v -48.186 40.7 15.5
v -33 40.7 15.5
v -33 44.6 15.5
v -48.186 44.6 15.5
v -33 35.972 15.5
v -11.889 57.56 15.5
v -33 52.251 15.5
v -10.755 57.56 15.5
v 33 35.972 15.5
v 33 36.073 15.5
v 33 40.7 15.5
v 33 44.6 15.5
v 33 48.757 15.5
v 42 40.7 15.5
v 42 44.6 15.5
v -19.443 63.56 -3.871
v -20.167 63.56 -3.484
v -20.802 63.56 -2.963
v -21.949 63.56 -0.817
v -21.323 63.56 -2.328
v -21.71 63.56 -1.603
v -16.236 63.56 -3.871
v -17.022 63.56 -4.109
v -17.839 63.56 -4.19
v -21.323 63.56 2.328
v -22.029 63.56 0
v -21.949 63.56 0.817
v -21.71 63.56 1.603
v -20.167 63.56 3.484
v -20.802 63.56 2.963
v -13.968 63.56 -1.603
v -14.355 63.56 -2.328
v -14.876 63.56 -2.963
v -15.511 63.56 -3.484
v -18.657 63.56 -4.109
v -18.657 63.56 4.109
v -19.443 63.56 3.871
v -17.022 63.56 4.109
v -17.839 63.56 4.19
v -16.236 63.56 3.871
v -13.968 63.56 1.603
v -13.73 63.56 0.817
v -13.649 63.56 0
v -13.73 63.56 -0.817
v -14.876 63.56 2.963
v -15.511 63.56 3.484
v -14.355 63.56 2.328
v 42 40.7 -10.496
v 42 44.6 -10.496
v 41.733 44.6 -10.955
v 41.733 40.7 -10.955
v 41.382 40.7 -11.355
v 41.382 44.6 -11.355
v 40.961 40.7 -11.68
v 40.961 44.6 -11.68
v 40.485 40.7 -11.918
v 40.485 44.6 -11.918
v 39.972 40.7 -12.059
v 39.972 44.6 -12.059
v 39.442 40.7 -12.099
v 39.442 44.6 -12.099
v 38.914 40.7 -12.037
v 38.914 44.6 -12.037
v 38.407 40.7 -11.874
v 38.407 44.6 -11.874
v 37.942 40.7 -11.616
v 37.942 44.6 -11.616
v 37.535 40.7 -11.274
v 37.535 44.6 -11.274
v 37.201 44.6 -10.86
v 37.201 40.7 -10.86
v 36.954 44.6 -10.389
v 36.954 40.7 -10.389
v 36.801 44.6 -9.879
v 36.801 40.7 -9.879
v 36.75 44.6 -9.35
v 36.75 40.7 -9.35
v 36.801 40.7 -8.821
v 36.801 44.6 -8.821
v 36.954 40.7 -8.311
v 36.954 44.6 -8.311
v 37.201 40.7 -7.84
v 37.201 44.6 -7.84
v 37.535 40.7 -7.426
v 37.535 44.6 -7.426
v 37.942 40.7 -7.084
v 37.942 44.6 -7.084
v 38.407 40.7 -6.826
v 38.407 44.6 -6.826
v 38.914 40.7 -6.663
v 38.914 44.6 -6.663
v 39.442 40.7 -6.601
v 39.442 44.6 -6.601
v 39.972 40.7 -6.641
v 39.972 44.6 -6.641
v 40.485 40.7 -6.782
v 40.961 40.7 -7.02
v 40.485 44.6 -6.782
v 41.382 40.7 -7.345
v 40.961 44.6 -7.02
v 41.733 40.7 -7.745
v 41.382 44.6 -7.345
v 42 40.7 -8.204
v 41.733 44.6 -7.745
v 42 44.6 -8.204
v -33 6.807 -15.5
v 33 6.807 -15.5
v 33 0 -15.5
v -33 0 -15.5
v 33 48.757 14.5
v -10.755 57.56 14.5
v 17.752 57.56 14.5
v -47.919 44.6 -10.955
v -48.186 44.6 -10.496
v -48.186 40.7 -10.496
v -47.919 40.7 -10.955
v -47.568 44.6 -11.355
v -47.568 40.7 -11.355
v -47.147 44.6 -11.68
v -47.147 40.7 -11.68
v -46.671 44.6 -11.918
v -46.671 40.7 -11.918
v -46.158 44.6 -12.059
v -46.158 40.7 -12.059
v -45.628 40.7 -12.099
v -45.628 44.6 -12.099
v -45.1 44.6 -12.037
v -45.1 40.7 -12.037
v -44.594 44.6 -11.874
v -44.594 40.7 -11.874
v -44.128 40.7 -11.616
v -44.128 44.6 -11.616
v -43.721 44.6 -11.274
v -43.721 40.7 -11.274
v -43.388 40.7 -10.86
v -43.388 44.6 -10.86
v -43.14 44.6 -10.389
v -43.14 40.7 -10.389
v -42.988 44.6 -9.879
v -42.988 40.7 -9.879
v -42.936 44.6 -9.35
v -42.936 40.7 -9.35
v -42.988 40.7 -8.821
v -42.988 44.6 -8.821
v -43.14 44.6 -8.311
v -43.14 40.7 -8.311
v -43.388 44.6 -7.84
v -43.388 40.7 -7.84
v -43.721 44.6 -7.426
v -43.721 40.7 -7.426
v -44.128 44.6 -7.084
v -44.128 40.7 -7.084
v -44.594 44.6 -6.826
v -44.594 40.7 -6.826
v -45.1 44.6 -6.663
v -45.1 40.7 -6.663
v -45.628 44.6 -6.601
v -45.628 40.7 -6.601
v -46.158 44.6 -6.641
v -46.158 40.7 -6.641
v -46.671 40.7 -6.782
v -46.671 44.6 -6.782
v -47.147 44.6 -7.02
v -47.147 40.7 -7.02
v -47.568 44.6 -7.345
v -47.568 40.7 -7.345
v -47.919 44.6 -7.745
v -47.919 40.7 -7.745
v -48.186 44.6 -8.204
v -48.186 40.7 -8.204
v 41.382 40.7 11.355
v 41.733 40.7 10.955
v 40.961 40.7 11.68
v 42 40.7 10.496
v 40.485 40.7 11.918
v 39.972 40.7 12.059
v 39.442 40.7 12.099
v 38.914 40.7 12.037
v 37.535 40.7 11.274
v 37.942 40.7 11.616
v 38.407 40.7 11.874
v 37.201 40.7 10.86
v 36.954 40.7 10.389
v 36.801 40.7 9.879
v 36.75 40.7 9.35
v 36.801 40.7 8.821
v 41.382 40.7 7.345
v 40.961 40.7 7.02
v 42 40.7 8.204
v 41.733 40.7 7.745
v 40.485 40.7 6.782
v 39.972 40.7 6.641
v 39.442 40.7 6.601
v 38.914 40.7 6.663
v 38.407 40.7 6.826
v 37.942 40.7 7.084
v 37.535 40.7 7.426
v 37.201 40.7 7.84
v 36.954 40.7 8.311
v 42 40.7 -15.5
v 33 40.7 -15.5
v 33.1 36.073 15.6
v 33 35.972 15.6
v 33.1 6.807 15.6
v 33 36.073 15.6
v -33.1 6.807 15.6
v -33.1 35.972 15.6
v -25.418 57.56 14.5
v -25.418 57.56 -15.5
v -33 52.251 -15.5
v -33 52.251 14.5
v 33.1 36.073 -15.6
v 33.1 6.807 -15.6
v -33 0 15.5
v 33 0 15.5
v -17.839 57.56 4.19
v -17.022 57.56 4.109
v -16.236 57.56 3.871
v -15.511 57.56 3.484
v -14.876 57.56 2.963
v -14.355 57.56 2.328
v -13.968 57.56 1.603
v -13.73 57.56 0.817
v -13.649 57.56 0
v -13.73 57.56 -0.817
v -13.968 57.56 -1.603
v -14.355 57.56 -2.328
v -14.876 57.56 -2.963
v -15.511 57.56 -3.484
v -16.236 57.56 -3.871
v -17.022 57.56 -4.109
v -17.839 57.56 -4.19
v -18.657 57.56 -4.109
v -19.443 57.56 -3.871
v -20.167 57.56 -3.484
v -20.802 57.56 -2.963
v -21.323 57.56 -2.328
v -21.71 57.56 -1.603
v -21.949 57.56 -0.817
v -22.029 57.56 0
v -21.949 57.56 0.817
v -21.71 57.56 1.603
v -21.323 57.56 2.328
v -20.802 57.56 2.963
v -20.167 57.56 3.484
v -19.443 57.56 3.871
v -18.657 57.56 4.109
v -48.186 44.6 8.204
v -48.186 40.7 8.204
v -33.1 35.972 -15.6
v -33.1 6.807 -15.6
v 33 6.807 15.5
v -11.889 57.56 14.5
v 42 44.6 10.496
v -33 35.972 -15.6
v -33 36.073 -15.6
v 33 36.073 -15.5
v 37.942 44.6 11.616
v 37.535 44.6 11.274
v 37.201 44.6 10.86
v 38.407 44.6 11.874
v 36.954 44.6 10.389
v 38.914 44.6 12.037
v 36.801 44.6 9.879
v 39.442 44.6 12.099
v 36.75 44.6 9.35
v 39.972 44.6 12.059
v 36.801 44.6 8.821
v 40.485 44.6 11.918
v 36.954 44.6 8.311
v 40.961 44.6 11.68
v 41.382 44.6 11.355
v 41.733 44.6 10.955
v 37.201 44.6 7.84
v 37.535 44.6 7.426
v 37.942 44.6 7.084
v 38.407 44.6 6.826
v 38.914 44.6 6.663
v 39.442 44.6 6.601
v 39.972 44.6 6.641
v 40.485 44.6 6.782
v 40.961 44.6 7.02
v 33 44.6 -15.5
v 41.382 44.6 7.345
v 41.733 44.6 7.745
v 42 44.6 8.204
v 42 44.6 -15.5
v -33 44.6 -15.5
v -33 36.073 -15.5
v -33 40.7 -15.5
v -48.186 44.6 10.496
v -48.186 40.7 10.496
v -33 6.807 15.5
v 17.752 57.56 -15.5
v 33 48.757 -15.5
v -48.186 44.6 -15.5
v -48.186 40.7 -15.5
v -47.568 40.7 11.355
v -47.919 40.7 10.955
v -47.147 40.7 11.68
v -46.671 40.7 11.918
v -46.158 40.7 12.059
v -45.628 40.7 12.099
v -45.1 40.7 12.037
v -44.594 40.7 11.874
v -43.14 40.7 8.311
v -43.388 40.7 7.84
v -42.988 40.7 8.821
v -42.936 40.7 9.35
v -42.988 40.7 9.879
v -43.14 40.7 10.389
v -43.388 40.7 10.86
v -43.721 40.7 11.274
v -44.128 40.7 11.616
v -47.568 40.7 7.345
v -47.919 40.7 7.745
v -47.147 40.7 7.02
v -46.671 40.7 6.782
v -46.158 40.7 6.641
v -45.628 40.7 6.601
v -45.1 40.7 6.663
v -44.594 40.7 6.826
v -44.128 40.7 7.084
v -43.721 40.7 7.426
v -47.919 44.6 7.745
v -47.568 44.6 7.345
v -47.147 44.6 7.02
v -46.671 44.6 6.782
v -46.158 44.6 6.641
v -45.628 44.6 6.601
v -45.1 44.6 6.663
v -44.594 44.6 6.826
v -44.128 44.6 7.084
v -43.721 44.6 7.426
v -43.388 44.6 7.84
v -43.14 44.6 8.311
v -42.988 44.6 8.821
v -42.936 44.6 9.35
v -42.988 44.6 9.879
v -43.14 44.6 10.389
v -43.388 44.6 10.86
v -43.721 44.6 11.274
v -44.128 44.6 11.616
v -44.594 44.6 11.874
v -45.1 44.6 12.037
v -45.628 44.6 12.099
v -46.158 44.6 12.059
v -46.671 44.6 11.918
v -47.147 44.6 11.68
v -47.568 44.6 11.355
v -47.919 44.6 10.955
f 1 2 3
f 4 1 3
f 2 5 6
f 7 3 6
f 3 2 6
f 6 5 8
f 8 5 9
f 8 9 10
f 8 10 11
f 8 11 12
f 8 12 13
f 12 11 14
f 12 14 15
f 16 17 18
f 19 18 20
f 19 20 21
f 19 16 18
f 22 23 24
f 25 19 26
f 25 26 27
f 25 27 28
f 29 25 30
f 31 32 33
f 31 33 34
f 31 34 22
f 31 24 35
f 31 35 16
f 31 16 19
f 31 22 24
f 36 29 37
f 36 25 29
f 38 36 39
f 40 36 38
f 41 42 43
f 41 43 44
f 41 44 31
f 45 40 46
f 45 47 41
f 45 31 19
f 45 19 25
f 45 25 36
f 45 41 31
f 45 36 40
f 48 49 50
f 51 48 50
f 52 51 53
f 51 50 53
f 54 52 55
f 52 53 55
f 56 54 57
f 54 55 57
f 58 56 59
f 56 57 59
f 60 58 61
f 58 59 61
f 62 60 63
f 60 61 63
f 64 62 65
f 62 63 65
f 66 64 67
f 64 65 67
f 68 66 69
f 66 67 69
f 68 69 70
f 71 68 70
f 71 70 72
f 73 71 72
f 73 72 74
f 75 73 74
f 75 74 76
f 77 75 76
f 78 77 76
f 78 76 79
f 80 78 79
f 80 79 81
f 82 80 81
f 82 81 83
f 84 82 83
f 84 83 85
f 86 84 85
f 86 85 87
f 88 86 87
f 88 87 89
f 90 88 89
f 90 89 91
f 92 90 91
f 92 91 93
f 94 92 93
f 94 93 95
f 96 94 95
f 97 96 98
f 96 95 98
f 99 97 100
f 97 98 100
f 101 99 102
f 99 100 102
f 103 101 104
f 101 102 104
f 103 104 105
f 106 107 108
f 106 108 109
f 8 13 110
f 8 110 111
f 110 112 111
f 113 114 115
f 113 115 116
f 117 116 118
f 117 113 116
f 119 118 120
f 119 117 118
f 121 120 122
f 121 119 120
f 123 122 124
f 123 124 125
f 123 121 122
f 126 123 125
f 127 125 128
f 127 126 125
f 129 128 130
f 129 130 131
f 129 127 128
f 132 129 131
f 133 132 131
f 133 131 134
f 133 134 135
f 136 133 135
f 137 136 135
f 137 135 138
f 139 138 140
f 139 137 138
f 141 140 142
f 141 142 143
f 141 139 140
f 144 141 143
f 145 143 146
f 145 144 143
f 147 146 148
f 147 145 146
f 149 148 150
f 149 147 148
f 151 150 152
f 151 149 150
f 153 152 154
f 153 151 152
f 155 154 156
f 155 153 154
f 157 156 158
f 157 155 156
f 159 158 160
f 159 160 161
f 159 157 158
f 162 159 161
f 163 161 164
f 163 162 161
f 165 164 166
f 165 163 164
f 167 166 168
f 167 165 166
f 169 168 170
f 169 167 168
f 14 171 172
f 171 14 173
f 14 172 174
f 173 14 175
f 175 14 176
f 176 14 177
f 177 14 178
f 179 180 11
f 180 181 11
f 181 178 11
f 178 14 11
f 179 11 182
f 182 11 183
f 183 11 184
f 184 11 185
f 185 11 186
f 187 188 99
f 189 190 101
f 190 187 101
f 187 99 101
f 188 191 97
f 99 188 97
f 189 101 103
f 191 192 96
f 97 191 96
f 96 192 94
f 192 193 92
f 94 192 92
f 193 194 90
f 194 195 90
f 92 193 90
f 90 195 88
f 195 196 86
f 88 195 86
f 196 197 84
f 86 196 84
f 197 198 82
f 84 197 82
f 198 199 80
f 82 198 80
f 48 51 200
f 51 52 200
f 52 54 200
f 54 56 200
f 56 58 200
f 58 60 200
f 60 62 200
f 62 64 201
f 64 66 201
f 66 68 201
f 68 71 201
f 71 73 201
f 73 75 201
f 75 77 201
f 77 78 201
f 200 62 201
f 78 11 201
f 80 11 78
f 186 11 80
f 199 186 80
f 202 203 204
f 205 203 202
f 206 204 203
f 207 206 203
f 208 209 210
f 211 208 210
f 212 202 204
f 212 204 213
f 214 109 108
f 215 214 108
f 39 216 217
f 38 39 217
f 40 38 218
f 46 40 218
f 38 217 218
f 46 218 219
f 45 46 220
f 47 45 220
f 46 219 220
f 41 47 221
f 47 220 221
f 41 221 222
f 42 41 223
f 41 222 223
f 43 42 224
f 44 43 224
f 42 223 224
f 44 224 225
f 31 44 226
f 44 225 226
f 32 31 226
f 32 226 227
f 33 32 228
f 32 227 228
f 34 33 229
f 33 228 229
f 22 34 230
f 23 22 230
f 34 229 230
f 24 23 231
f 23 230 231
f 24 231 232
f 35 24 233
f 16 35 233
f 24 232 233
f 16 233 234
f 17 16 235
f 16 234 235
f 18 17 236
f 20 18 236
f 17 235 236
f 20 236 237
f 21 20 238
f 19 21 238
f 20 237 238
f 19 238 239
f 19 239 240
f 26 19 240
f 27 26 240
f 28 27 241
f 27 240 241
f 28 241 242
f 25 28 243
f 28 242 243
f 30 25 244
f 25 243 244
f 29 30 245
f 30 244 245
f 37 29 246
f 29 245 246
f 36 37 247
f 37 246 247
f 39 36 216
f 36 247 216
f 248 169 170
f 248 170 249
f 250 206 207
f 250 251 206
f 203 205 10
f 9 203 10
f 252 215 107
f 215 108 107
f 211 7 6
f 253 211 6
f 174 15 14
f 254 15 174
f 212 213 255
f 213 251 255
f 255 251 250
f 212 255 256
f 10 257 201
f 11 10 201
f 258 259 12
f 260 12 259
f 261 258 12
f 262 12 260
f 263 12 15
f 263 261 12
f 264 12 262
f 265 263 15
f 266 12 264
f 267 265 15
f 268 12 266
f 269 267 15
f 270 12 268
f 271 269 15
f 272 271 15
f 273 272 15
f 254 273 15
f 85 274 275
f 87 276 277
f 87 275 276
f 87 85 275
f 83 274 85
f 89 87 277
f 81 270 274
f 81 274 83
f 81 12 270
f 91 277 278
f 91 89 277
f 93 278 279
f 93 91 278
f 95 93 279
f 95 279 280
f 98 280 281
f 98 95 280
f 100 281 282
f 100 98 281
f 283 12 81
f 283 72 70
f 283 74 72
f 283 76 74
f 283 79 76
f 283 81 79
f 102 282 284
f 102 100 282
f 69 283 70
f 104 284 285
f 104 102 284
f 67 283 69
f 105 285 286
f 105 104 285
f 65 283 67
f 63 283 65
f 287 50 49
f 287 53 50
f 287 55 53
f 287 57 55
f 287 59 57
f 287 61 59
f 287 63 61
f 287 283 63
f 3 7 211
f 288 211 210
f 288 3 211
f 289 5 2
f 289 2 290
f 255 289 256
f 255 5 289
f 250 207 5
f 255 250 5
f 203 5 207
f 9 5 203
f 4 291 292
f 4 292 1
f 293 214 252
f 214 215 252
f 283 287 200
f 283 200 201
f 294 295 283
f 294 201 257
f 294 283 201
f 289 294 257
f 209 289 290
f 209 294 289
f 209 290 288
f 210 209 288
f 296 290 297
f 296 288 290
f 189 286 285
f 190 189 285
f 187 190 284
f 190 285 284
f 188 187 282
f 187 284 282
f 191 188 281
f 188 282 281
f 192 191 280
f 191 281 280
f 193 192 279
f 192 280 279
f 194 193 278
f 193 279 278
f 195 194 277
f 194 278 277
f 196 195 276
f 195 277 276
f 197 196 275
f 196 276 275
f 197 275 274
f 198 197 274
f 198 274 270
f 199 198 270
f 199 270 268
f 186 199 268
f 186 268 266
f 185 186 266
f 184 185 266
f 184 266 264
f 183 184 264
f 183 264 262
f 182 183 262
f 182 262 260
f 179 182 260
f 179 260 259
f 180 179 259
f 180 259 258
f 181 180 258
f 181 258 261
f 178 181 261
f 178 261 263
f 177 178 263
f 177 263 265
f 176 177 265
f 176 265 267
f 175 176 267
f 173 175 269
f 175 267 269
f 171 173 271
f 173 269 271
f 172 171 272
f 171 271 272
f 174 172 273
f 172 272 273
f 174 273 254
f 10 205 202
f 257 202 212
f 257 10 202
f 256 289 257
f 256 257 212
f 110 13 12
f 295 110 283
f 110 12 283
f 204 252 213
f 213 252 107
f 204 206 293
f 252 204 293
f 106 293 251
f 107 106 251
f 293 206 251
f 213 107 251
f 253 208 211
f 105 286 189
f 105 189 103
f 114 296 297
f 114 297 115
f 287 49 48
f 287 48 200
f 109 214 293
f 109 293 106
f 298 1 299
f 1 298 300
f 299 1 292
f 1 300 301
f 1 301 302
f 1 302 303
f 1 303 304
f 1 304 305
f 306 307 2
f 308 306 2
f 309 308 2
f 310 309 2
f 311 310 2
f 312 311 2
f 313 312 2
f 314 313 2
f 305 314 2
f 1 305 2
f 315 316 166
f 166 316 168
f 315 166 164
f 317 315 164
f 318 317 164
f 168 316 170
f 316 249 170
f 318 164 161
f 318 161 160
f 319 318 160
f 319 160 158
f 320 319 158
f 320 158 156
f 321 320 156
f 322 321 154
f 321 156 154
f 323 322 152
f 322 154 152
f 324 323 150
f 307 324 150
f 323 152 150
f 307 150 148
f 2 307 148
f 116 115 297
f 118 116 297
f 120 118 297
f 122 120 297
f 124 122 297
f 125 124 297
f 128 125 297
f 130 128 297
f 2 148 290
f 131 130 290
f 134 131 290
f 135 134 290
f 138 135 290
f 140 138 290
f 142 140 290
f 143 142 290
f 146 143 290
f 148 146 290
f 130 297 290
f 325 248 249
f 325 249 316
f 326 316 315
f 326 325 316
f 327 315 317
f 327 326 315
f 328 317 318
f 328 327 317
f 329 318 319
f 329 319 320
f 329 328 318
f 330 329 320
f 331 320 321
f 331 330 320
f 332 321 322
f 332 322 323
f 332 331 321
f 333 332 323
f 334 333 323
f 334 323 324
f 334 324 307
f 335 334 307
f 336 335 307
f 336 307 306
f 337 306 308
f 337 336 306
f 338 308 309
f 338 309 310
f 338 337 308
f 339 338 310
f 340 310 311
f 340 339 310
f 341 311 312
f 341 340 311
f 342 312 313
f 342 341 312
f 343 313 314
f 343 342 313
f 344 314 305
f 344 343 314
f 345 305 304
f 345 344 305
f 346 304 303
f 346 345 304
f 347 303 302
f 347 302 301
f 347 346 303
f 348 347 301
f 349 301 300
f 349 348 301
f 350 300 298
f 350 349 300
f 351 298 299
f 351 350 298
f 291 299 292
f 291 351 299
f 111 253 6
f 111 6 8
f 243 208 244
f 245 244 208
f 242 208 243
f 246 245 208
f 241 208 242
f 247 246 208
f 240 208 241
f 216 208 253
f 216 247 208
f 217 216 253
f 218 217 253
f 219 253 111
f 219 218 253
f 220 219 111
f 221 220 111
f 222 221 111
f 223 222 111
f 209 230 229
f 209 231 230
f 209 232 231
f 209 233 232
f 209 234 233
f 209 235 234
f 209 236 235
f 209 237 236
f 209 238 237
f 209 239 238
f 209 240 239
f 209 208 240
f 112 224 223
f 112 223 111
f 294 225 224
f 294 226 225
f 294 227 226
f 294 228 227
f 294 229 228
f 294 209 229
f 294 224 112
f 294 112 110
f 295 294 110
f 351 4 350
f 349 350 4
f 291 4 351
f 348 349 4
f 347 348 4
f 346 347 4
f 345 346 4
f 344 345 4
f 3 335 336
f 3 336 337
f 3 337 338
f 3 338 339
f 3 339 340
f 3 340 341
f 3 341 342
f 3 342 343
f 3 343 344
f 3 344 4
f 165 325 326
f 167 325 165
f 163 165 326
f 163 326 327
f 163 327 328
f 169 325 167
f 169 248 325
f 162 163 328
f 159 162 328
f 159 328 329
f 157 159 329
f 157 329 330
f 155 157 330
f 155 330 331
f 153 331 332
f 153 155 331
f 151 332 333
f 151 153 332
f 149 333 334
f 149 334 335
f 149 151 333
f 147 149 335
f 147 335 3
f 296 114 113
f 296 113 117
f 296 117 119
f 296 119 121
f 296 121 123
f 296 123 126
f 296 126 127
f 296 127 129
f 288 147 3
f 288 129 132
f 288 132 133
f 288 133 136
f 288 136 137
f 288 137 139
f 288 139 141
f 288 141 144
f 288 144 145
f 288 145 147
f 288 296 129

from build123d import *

# Parameters (mm, degrees)
SKETCH2_W            = 66
SKETCH2_H            = 31
BOSS_EXTRUDE1_DEPTH  = 44.6
SKETCH4_W            = 31
SKETCH4_H            = 3.9
BOSS_EXTRUDE2_DEPTH  = 9
SKETCH6_R            = 2.75
CUT_EXTRUDE3_DEPTH   = 64.193433203
BOSS_EXTRUDE4_DEPTH  = 3.9
SKETCH8_W            = 66
SKETCH8_H            = 31
BOSS_EXTRUDE5_DEPTH  = 12.96
CUT_EXTRUDE7_DEPTH   = 82.21610038
CUT_EXTRUDE8_DEPTH   = 82.21610038
CUT_EXTRUDE9_DEPTH   = 1
SKETCH12_R           = 4.19
BOSS_EXTRUDE6_DEPTH  = 6
SKETCH13_W           = 66
SKETCH13_H           = 29.265979079
BOSS_EXTRUDE7_DEPTH  = 0.1
SKETCH14_W           = 31.1
SKETCH14_H           = 29.164669929
BOSS_EXTRUDE8_DEPTH  = 0.1
SKETCH15_W           = 66.1
SKETCH15_H           = 29.164669929
BOSS_EXTRUDE9_DEPTH  = 0.1
SKETCH16_W           = 31.2
SKETCH16_H           = 29.265979079
BOSS_EXTRUDE10_DEPTH = 0.1


with BuildPart() as part:
    # Sketch2 → Boss-Extrude1 (new body)
    with BuildSketch(Plane(origin=(0, 0, 0), x_dir=(1, 0, 0), z_dir=(0, 1, 0))):
        Rectangle(SKETCH2_W, SKETCH2_H)
    extrude(amount=BOSS_EXTRUDE1_DEPTH)

    # Sketch4 → Boss-Extrude2 (add)
    with BuildSketch(Plane(origin=(33, 0, 0), x_dir=(0, 0, -1), z_dir=(1, 0, 0))):
        with Locations((0, 42.65)):
            Rectangle(SKETCH4_W, SKETCH4_H)
    extrude(amount=BOSS_EXTRUDE2_DEPTH)

    # Sketch6 → Cut-Extrude3 (cut, through all)
    with BuildSketch(Plane(origin=(0, 44.6, 0), x_dir=(1, 0, 0), z_dir=(0, 1, 0))):
        with Locations((39.5, -9.35)):
            Circle(SKETCH6_R)
        with Locations((39.5, 9.35)):
            Circle(SKETCH6_R)
    extrude(amount=-CUT_EXTRUDE3_DEPTH, mode=Mode.SUBTRACT)

    # Sketch7 → Boss-Extrude4 (add)
    with BuildSketch(Plane(origin=(0, 44.6, 0), x_dir=(1, 0, 0), z_dir=(0, 1, 0))):
        with BuildLine():
            Line((-33, 15.5), (-48.186111703, 15.5))
            Line((-48.186111703, 15.5), (-48.186111703, 10.495643924))
            ThreePointArc((-48.186111703, 10.495643924), (-42.936111703, 9.35), (-48.186111703, 8.204356076))
            Line((-48.186111703, 8.204356076), (-48.186111703, -8.204356076))
            ThreePointArc((-48.186111703, -8.204356076), (-42.936111703, -9.35), (-48.186111703, -10.495643924))
            Line((-48.186111703, -10.495643924), (-48.186111703, -15.5))
            Line((-48.186111703, -15.5), (-33, -15.5))
            Line((-33, -15.5), (-33, 15.5))
        make_face()
    extrude(amount=-BOSS_EXTRUDE4_DEPTH)

    # Sketch8 → Boss-Extrude5 (add)
    with BuildSketch(Plane(origin=(0, 44.6, 0), x_dir=(1, 0, 0), z_dir=(0, 1, 0))):
        Rectangle(SKETCH8_W, SKETCH8_H)
    extrude(amount=BOSS_EXTRUDE5_DEPTH)

    # Sketch9 → Cut-Extrude7 (cut, through all)
    with BuildSketch(Plane.XY.offset(15.5)):
        Polygon((-25.417976584, 57.56), (-33, 52.251010049), (-33, 57.56), align=None)
    extrude(amount=-CUT_EXTRUDE7_DEPTH, mode=Mode.SUBTRACT)

    # Sketch10 → Cut-Extrude8 (cut, through all)
    with BuildSketch(Plane.XY.offset(15.5)):
        Polygon((17.751890933, 57.56), (33, 48.756500125), (33, 57.56), align=None)
    extrude(amount=-CUT_EXTRUDE8_DEPTH, mode=Mode.SUBTRACT)

    # Sketch11 → Cut-Extrude9 (cut)
    with BuildSketch(Plane.XY.offset(15.5)):
        Polygon((-33, 52.251010049), (-11.889467425, 57.56), (-25.417976584, 57.56), align=None)
        Polygon((33, 48.756500125), (-10.755426907, 57.56), (17.751890933, 57.56), align=None)
    extrude(amount=-CUT_EXTRUDE9_DEPTH, mode=Mode.SUBTRACT)

    # Sketch12 → Boss-Extrude6 (add)
    with BuildSketch(Plane(origin=(0, 57.56, 0), x_dir=(1, 0, 0), z_dir=(0, 1, 0))):
        with Locations(Location((-17.839262747, 0, 0), (0, 0, 270))):
            Circle(SKETCH12_R)
    extrude(amount=BOSS_EXTRUDE6_DEPTH)

    # Sketch13 → Boss-Extrude7 (add)
    with BuildSketch(Plane(origin=(0, 0, -15.5), x_dir=(-1, 0, 0), z_dir=(0, 0, -1))):
        with Locations((0, 21.440452746)):
            Rectangle(SKETCH13_W, SKETCH13_H)
    extrude(amount=BOSS_EXTRUDE7_DEPTH)

    # Sketch14 → Boss-Extrude8 (add)
    with BuildSketch(Plane.ZY.offset(33)):
        with Locations((-0.05, 21.389798171)):
            Rectangle(SKETCH14_W, SKETCH14_H)
    extrude(amount=BOSS_EXTRUDE8_DEPTH)

    # Sketch15 → Boss-Extrude9 (add)
    with BuildSketch(Plane.XY.offset(15.5)):
        with Locations((-0.05, 21.389798171)):
            Rectangle(SKETCH15_W, SKETCH15_H)
    extrude(amount=BOSS_EXTRUDE9_DEPTH)

    # Sketch16 → Boss-Extrude10 (add)
    with BuildSketch(Plane(origin=(33, 0, 0), x_dir=(0, 0, -1), z_dir=(1, 0, 0))):
        with Locations((0, 21.440452746)):
            Rectangle(SKETCH16_W, SKETCH16_H)
    extrude(amount=BOSS_EXTRUDE10_DEPTH)


solid = part.part
